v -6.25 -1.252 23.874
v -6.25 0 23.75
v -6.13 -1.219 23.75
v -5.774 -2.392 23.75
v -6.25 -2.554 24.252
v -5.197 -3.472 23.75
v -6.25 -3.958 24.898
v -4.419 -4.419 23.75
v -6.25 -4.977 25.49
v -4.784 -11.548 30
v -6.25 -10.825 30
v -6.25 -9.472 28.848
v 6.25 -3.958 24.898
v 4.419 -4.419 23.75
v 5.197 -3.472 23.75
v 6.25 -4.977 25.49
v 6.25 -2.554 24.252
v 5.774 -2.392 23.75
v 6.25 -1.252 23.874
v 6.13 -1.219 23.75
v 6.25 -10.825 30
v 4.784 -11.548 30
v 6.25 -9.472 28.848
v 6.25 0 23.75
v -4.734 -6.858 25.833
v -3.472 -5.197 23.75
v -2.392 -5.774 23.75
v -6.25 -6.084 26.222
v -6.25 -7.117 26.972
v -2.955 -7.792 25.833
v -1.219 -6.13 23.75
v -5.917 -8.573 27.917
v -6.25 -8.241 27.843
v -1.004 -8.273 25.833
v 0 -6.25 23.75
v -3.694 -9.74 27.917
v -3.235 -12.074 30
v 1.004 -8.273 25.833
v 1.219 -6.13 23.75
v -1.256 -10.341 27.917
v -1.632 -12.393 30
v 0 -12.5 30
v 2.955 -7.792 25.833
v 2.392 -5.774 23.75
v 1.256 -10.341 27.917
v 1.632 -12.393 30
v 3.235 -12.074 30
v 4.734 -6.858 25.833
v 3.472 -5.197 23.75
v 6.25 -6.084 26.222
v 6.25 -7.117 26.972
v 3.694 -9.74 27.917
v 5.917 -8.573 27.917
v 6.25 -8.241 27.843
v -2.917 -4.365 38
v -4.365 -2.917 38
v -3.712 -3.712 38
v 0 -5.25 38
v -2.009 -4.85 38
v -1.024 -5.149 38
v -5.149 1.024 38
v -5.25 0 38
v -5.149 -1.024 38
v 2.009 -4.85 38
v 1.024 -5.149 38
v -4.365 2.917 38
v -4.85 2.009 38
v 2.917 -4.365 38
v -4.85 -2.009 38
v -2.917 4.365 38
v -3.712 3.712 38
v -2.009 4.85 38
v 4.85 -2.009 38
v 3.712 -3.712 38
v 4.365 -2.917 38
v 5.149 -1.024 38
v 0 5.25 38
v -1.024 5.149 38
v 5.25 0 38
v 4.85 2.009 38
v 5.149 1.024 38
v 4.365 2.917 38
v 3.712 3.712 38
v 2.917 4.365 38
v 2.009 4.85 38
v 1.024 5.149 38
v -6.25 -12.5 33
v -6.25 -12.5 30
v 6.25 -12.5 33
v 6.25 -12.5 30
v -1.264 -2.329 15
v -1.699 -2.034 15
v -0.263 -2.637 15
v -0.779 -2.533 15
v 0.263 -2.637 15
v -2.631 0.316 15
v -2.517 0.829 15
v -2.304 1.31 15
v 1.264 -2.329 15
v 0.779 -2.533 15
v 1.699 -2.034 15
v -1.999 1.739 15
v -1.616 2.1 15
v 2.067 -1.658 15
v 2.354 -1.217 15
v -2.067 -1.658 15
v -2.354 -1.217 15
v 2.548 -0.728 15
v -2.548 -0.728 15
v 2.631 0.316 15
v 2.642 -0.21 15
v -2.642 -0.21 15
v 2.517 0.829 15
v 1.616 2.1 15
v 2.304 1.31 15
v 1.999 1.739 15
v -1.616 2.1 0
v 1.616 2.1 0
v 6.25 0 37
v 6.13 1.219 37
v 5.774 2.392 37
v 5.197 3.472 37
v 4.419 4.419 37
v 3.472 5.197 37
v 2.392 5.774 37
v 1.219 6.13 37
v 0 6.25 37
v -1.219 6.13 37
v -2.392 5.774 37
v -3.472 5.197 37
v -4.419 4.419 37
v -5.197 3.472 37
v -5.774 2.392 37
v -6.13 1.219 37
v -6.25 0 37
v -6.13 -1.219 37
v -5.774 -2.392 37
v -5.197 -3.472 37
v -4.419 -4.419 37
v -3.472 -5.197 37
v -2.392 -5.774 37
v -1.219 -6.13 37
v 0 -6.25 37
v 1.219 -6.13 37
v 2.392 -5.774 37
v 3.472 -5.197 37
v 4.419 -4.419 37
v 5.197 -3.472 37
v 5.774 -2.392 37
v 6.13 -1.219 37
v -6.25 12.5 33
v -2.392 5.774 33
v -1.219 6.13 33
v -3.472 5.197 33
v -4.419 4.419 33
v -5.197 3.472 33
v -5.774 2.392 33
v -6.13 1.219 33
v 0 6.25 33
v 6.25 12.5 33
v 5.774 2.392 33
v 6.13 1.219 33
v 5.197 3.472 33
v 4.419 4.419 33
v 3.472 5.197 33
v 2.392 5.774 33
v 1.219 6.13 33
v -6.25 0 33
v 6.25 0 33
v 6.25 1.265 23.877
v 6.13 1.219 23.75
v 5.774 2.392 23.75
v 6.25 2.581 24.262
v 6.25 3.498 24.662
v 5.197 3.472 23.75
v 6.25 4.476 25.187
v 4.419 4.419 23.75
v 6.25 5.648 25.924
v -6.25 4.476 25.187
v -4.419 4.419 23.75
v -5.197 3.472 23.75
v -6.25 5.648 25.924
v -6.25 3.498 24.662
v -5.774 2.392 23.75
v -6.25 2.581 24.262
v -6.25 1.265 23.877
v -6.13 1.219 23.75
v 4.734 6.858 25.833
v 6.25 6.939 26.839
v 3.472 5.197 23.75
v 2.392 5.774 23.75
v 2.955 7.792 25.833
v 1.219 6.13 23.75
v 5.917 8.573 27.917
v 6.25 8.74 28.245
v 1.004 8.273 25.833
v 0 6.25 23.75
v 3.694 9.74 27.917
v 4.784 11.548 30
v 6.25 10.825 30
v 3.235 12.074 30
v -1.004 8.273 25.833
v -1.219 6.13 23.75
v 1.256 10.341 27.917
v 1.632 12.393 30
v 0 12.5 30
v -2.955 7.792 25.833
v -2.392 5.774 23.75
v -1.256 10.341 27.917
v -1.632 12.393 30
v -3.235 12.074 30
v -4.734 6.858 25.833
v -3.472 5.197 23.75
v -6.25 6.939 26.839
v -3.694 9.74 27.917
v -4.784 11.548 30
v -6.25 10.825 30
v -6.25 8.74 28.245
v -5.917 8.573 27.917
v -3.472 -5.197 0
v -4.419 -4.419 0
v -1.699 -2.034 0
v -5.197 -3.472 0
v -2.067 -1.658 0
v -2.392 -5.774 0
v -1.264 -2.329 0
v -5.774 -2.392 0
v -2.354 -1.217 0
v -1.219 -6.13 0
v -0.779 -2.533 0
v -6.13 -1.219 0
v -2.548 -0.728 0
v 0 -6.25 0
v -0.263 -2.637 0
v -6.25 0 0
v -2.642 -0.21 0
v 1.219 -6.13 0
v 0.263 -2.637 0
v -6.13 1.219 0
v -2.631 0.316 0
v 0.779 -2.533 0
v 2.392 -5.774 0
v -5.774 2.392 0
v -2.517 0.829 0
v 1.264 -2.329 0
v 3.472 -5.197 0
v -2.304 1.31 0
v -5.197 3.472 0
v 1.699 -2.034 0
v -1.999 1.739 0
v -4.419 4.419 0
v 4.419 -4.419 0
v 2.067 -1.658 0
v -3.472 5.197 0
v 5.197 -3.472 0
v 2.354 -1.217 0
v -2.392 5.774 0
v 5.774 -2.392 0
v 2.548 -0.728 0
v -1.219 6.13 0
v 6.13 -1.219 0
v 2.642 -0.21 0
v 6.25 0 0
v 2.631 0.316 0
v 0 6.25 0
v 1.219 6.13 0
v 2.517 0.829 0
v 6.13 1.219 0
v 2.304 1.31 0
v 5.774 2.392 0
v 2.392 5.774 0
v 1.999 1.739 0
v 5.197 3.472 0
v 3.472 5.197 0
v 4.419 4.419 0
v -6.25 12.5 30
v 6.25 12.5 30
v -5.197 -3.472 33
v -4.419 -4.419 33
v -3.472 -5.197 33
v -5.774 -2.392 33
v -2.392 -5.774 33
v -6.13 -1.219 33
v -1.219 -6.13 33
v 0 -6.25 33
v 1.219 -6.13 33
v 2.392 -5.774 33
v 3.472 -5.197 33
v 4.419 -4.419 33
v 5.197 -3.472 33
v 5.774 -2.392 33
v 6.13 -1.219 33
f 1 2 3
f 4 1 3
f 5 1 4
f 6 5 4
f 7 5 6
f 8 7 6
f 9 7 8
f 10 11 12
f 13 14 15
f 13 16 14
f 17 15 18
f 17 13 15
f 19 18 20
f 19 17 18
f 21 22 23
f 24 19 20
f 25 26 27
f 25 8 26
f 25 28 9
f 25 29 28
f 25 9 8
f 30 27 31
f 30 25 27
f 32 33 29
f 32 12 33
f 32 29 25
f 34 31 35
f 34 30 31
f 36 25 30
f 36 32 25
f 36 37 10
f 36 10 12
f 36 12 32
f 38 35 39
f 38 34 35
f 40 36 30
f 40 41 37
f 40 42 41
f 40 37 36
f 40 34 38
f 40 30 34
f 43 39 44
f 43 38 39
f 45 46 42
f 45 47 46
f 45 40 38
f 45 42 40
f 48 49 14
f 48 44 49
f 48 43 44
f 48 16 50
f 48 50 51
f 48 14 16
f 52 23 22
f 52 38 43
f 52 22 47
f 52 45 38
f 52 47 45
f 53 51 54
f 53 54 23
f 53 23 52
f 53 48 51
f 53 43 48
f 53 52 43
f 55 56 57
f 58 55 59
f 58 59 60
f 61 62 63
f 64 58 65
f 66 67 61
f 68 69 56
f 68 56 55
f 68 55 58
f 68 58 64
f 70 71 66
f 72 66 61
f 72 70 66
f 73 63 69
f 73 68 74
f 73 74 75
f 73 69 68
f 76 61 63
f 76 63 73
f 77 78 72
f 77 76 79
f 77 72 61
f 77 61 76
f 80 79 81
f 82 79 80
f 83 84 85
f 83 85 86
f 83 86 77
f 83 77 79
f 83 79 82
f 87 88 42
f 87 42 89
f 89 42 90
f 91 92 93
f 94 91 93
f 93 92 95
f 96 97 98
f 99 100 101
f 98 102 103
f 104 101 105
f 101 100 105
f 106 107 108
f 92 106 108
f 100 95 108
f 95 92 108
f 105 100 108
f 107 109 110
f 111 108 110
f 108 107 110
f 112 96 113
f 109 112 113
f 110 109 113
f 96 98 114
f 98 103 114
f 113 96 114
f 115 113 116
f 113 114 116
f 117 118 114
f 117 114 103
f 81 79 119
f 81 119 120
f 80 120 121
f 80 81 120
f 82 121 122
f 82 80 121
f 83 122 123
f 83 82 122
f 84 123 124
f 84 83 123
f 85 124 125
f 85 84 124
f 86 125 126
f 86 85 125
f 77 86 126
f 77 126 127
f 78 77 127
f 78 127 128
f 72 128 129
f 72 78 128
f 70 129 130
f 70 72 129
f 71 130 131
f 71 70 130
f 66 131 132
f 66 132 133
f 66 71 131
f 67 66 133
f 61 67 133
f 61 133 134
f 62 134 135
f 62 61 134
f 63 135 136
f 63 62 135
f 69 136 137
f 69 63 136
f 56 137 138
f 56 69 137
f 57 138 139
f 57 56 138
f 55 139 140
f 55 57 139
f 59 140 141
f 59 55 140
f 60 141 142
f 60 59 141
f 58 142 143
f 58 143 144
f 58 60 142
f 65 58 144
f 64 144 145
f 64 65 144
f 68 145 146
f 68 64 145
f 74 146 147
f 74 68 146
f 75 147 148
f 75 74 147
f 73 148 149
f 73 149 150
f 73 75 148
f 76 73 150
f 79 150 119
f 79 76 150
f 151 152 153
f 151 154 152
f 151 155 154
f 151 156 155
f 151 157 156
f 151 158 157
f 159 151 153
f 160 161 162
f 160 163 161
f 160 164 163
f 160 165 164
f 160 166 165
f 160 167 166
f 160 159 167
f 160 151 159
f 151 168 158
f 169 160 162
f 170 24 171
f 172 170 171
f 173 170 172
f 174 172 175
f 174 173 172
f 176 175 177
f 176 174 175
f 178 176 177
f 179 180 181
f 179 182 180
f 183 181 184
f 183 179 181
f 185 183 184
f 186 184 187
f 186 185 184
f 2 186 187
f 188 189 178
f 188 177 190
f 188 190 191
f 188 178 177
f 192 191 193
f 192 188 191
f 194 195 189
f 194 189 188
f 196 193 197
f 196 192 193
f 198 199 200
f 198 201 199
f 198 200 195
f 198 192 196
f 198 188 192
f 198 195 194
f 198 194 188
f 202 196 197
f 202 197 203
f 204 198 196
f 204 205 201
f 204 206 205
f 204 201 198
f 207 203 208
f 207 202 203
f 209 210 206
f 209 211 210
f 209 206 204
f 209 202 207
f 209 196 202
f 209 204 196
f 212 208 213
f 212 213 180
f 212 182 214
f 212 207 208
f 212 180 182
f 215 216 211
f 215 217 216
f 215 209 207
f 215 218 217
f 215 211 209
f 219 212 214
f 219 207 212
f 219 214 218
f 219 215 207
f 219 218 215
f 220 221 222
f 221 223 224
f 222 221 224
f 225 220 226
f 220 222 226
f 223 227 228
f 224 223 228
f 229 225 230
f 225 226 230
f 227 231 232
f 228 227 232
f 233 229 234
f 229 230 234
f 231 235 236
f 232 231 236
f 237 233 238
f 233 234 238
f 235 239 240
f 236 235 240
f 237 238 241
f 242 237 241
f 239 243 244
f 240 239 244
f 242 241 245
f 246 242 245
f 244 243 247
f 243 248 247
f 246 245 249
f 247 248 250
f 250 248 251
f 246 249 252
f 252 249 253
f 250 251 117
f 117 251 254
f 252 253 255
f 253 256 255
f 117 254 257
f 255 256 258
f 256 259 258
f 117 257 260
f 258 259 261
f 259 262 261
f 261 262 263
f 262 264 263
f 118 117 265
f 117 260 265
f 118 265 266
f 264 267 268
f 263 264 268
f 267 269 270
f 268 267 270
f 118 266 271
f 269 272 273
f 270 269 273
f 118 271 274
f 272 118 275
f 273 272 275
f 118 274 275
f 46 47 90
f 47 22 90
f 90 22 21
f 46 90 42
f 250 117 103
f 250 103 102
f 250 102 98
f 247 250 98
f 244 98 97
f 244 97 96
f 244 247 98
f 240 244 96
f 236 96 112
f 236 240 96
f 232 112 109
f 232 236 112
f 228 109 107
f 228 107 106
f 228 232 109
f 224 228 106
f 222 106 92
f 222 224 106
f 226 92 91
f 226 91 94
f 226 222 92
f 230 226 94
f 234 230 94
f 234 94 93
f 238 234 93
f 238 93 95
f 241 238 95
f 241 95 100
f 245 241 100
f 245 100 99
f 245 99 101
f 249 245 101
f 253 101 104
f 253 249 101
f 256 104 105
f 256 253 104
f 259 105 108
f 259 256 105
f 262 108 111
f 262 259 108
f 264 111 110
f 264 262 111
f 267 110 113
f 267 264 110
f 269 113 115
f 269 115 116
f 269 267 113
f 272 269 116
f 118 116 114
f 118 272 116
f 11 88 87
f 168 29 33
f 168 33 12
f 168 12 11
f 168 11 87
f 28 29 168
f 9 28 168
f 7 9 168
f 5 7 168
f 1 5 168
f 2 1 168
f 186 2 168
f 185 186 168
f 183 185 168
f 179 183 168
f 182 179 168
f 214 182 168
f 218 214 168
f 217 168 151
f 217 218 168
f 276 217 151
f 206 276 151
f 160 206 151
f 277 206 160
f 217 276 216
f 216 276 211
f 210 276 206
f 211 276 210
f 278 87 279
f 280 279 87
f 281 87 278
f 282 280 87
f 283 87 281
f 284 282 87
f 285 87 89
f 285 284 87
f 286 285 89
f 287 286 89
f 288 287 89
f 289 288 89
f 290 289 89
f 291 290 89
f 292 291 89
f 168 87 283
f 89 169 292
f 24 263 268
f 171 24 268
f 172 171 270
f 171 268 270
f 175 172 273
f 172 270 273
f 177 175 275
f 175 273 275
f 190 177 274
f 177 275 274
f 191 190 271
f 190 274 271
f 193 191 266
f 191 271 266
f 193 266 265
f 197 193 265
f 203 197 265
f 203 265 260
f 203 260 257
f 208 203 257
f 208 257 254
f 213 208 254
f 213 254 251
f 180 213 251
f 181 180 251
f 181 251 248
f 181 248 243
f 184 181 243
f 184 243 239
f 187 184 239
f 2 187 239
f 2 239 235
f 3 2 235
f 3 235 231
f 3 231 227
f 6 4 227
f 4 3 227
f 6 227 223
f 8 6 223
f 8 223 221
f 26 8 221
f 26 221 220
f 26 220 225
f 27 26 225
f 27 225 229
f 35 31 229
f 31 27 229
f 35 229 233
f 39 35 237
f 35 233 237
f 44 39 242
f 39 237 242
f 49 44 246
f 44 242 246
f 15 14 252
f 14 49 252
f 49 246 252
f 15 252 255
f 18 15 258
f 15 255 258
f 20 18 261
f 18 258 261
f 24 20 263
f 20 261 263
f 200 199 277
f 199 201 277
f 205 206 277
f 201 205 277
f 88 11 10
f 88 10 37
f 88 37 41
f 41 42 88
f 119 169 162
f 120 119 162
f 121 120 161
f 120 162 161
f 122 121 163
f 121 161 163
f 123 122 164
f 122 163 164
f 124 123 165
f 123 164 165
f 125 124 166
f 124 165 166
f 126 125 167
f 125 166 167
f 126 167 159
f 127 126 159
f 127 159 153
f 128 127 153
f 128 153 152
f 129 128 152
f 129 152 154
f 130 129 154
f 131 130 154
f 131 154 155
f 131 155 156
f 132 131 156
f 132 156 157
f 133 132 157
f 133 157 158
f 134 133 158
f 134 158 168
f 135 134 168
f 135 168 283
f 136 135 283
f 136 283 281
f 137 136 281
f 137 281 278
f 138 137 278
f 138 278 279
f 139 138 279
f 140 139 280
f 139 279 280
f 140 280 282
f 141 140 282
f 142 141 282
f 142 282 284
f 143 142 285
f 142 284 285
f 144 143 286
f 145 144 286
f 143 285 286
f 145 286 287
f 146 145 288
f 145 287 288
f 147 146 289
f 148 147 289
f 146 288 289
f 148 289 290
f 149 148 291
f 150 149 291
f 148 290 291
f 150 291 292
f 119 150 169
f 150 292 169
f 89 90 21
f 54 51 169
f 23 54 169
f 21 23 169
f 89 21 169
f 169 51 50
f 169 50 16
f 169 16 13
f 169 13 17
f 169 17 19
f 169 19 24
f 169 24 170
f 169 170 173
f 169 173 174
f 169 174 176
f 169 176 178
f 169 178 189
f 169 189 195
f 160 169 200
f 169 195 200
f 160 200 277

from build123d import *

# Parameters (mm, degrees)
SKETCH1_R           = 6.25
BOSS_EXTRUDE1_DEPTH = 30
CUT_EXTRUDE3_DEPTH  = 15
SKETCH9_W           = 12.5
SKETCH9_H           = 25
BOSS_EXTRUDE2_DEPTH = 3
SKETCH11_W          = 10.933781676
SKETCH11_H          = 25
SKETCH11_W_2        = 11.938681189
CUT_EXTRUDE4_DEPTH  = 34
SKETCH12_R          = 6.25
BOSS_EXTRUDE3_DEPTH = 5
CHAMFER1_SIZE       = 1


with BuildPart() as part:
    # Sketch1 → Boss-Extrude1 (new body)
    with BuildSketch(Plane.XY):
        Circle(SKETCH1_R)
    extrude(amount=BOSS_EXTRUDE1_DEPTH)

    # Sketch8 → Cut-Extrude3 (cut)
    with BuildSketch(Plane(origin=(0, 0, 0), x_dir=(-1, 0, 0), z_dir=(0, 0, -1))):
        with BuildLine():
            Line((-1.616322988, 2.1), (1.616322988, 2.1))
            ThreePointArc((1.616322988, 2.1), (0, -2.65), (-1.616322988, 2.1))
        make_face()
    extrude(amount=-CUT_EXTRUDE3_DEPTH, mode=Mode.SUBTRACT)

    # Sketch9 → Boss-Extrude2 (add)
    with BuildSketch(Plane.XY.offset(30)):
        Rectangle(SKETCH9_W, SKETCH9_H)
    extrude(amount=BOSS_EXTRUDE2_DEPTH)

    # Sketch10 → Revolve1 (revolve)
    with BuildSketch(Plane(origin=(0, 0, 0), x_dir=(0, 0, -1), z_dir=(1, 0, 0))):
        Polygon((-30, 12.5), (-30, 0), (-17.5, 0), align=None)
    revolve(axis=Axis((0, 0, 63.541170981), (0, 0, 1)))

    # Sketch11 → Cut-Extrude4 (cut, through all)
    with BuildSketch(Plane.XY.offset(33)):
        with Locations((-11.716890838, 0)):
            Rectangle(SKETCH11_W, SKETCH11_H)
        with Locations((12.219340595, 0)):
            Rectangle(SKETCH11_W_2, SKETCH11_H)
    extrude(amount=-CUT_EXTRUDE4_DEPTH, mode=Mode.SUBTRACT)

    # Sketch12 → Boss-Extrude3 (add)
    with BuildSketch(Plane.XY.offset(33)):
        Circle(SKETCH12_R)
    extrude(amount=BOSS_EXTRUDE3_DEPTH)

    # Chamfer1
    chamfer1_edges = [part.edges().sort_by_distance(p)[0] for p in [
        (-6.25, 0, 38),
    ]]
    chamfer(chamfer1_edges, length=CHAMFER1_SIZE)


solid = part.part
